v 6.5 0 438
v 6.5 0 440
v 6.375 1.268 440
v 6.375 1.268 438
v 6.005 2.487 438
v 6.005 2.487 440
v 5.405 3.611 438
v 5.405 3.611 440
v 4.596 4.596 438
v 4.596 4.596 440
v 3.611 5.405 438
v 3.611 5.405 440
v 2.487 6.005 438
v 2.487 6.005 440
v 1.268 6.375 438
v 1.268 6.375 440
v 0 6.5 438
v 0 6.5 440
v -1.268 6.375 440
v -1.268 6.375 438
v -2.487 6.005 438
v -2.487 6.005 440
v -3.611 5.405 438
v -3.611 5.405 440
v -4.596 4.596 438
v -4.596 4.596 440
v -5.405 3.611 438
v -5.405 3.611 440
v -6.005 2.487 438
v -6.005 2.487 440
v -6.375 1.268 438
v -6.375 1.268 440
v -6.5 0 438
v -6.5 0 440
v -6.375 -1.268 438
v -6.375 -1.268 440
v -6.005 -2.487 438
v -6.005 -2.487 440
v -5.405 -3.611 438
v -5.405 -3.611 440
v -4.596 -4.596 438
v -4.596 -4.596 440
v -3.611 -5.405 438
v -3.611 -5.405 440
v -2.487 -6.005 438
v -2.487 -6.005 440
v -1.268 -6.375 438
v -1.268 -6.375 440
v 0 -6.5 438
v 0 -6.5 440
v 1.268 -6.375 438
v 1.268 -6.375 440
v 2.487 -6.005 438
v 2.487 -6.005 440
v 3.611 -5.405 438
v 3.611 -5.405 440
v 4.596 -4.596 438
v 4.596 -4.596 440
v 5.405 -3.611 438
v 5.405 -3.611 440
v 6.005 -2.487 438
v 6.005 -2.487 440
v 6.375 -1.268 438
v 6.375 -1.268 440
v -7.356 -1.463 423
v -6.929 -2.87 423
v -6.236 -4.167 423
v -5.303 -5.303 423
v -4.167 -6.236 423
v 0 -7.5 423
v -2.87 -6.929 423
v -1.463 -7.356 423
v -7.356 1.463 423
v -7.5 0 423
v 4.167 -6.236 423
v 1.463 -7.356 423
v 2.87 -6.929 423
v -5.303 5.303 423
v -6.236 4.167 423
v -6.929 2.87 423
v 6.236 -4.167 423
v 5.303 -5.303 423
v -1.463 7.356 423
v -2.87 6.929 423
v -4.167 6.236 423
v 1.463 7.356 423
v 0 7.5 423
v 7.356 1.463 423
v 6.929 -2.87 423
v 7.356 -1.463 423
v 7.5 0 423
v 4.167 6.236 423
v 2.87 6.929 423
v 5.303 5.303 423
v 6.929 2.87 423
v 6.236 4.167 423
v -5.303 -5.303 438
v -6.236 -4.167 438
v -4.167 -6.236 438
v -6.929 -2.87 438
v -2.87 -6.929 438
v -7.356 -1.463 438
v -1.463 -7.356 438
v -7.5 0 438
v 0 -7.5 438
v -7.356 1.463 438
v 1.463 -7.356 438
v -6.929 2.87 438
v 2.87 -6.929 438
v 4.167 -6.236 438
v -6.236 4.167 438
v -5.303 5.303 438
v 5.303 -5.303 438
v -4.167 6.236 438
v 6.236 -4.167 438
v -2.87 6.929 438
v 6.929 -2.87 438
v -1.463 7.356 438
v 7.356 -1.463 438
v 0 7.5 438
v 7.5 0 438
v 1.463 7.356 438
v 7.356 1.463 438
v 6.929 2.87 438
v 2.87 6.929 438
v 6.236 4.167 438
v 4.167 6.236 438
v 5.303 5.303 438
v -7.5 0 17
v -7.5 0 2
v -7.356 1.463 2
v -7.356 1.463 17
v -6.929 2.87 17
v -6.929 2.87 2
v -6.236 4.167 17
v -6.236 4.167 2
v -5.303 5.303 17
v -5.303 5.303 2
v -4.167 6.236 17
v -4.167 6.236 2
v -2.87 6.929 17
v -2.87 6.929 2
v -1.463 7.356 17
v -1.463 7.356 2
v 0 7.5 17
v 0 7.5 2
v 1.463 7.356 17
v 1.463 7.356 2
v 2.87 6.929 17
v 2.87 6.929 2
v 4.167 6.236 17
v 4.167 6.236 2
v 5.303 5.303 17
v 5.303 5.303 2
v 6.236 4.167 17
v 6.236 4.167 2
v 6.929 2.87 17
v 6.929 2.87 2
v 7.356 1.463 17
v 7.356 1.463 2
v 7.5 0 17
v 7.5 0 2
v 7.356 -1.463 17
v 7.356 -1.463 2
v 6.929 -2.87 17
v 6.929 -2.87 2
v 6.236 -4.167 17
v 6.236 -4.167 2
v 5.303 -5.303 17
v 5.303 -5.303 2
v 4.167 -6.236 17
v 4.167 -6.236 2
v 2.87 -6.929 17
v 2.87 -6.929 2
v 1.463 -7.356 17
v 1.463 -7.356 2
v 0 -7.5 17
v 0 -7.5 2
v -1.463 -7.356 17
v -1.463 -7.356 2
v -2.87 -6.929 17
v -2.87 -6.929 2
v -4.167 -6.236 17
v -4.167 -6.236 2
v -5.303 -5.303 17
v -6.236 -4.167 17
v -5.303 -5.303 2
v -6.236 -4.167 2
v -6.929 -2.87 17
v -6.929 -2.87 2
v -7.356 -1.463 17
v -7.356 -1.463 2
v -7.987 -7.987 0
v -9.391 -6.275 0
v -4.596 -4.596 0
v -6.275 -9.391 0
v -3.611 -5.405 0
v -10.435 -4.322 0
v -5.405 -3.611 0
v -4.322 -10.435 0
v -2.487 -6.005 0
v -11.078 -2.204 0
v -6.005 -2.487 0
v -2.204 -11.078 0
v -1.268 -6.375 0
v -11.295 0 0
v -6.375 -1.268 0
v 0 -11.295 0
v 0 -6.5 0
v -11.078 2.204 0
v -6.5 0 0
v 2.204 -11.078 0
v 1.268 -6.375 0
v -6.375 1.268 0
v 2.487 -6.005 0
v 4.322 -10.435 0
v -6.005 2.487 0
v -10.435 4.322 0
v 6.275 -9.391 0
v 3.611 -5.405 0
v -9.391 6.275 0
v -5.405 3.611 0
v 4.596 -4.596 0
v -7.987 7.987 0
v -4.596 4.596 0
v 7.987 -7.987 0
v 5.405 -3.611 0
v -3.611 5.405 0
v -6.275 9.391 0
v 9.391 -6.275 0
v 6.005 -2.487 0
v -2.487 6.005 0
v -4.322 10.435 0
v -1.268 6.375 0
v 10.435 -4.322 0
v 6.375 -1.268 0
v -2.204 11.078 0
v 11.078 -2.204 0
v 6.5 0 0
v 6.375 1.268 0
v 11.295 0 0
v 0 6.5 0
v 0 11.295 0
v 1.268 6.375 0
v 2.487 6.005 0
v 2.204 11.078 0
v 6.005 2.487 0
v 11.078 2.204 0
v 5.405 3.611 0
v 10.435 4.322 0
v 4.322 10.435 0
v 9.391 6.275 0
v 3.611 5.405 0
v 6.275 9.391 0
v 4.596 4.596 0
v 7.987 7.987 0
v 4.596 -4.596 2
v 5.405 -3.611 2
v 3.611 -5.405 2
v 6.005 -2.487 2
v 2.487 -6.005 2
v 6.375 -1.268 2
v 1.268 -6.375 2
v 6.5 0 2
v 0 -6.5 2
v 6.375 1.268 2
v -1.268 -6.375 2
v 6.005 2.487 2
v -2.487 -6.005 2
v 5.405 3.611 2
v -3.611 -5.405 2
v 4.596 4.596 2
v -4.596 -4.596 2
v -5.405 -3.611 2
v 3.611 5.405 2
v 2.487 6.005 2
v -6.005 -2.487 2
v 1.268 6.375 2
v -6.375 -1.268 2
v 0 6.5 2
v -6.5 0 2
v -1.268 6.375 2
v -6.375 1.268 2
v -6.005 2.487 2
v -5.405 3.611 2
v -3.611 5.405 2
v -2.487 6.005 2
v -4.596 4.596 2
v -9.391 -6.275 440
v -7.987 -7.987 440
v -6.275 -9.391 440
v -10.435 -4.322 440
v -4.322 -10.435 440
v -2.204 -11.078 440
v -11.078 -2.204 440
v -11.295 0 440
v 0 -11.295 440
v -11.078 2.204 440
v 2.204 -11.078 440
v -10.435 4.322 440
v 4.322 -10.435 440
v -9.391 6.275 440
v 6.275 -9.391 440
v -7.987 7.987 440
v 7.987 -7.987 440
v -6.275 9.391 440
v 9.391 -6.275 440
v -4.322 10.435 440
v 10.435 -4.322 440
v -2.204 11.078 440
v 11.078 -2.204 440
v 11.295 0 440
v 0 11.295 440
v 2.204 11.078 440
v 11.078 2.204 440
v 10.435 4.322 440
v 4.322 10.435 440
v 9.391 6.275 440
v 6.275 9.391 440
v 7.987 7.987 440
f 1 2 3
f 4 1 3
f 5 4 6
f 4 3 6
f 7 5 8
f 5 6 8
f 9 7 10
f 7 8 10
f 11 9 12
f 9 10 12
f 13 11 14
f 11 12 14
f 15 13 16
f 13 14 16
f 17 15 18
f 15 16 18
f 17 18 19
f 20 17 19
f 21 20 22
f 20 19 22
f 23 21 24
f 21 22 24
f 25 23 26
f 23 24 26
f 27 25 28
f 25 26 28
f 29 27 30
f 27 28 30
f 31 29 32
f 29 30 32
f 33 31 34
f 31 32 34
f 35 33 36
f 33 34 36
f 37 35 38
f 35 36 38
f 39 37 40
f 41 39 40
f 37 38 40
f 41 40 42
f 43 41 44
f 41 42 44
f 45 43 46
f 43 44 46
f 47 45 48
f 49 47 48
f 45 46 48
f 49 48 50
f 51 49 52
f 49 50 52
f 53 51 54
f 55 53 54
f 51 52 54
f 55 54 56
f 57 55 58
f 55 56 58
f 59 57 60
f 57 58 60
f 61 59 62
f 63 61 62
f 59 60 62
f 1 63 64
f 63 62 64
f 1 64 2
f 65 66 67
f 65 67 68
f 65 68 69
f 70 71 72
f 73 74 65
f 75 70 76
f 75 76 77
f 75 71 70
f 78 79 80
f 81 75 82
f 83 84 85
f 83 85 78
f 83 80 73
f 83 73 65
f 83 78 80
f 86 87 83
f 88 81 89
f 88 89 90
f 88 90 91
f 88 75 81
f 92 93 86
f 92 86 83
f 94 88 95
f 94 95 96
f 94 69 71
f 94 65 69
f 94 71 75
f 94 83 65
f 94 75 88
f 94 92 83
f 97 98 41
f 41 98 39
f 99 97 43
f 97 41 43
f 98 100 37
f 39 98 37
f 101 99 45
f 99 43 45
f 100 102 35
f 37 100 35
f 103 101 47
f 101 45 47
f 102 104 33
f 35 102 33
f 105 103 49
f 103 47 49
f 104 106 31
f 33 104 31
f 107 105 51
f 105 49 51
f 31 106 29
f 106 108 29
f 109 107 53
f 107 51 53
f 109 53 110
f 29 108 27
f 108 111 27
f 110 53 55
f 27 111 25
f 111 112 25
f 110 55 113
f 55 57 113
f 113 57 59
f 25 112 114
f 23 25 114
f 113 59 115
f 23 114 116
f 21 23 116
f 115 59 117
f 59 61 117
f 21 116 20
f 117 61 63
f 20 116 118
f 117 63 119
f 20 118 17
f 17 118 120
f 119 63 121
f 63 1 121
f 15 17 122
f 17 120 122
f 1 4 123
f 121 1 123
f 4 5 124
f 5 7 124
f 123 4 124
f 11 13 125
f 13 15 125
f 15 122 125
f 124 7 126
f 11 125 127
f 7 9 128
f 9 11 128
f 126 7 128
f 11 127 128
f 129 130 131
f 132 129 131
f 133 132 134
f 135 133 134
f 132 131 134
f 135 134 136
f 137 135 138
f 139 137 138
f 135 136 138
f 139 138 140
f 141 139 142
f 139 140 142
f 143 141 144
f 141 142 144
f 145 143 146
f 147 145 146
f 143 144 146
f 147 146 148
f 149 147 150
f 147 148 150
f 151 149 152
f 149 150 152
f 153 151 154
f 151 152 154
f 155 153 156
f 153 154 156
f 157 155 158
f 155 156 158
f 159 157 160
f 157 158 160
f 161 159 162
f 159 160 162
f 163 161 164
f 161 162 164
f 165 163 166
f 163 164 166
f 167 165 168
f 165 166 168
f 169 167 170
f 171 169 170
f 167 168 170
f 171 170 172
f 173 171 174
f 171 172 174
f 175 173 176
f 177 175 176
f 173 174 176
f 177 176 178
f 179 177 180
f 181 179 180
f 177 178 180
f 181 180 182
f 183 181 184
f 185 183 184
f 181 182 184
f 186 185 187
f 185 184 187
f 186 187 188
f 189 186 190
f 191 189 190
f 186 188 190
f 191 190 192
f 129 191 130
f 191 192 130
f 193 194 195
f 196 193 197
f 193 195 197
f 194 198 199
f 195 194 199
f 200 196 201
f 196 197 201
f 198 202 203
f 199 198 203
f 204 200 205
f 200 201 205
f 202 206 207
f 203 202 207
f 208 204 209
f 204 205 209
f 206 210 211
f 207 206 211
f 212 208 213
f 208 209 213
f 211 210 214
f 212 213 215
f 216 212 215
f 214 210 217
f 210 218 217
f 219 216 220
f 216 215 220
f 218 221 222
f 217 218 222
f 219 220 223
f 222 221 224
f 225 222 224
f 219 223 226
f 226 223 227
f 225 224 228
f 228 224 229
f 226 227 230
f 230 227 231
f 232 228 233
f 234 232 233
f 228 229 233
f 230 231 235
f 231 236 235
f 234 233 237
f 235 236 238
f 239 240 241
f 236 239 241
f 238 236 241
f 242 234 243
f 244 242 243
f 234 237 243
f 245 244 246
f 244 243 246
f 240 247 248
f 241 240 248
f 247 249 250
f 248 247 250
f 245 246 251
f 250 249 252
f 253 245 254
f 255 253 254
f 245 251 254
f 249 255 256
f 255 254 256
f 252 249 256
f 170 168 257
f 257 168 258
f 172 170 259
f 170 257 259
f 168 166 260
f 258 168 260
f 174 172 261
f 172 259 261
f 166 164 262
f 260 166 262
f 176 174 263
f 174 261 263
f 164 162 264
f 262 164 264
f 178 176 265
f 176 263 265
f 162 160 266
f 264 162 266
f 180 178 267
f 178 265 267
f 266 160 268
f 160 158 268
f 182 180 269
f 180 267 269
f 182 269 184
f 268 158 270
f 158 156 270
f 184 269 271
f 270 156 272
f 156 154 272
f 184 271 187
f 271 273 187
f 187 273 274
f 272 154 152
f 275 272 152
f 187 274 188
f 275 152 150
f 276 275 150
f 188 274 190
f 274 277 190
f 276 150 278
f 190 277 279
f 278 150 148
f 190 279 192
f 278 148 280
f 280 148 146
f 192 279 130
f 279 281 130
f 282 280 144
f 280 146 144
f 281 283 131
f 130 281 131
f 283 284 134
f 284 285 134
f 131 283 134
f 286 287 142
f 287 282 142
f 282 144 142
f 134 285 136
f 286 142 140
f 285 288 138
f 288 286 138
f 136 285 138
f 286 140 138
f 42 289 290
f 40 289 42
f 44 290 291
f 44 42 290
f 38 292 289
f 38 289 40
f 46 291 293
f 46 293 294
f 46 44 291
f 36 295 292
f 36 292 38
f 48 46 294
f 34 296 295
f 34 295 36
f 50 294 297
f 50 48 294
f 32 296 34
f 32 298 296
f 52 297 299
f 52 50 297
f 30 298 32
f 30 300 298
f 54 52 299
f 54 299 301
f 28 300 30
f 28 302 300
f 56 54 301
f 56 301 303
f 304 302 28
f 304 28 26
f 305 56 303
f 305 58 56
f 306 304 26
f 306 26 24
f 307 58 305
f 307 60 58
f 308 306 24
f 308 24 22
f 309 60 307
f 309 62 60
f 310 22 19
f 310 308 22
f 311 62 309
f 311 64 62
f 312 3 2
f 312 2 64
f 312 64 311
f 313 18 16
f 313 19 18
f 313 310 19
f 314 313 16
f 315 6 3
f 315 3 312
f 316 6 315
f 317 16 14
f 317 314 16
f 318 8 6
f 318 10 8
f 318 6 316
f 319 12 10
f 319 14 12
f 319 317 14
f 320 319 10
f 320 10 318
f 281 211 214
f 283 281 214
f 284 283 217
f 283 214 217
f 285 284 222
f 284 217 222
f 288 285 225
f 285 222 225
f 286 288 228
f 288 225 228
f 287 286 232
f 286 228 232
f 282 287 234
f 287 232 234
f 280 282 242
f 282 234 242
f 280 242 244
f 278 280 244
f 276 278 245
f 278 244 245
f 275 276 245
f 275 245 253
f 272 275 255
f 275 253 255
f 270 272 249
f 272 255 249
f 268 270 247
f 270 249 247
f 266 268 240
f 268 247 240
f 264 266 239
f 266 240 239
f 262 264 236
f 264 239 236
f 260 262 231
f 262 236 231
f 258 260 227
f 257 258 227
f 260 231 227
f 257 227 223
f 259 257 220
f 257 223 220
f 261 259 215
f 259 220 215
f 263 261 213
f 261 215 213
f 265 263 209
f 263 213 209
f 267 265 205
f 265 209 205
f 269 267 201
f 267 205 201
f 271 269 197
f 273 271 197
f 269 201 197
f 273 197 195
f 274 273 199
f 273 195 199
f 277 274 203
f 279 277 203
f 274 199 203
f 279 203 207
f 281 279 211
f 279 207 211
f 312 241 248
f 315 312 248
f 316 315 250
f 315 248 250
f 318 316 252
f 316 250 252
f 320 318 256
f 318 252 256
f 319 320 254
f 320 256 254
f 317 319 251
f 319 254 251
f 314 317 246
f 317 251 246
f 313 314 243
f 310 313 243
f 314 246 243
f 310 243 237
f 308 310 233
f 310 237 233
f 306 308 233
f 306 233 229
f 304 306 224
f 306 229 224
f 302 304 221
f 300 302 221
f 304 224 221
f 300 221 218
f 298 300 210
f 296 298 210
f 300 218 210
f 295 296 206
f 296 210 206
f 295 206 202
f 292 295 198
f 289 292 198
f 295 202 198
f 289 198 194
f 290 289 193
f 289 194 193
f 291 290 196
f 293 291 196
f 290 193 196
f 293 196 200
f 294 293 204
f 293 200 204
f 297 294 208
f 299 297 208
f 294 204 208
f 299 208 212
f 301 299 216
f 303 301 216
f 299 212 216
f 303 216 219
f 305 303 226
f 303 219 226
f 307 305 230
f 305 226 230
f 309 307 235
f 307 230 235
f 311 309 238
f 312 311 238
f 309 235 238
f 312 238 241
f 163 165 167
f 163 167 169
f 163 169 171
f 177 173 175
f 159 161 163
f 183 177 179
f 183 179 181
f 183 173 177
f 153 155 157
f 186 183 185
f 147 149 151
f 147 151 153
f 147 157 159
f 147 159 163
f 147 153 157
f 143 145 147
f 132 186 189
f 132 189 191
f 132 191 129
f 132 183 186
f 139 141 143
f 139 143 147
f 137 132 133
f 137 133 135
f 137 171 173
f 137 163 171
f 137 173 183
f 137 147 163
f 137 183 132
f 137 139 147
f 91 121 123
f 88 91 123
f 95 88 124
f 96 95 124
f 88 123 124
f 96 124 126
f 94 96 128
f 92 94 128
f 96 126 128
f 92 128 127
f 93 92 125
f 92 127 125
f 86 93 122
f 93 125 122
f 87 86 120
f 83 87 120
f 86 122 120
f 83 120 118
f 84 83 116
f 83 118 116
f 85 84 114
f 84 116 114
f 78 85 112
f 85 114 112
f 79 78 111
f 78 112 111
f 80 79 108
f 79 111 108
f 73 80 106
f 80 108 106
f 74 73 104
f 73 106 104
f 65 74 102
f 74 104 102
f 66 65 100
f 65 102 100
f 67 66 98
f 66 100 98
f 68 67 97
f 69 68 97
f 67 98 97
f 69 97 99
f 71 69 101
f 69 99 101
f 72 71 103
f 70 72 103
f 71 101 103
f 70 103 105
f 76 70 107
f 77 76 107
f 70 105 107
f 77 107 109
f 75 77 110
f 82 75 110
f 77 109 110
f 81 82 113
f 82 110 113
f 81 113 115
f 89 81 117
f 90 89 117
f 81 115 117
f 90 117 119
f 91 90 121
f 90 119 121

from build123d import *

# Parameters (mm, degrees)
SKETCH1_R           = 11.295
BOSS_EXTRUDE1_DEPTH = 440
SKETCH4_R           = 6.5
CUT_EXTRUDE4_DEPTH  = 2
SKETCH5_R           = 7.5
CUT_EXTRUDE5_DEPTH  = 15
SKETCH6_R           = 6.5
CUT_EXTRUDE7_DEPTH  = 2
SKETCH8_R           = 7.5
CUT_EXTRUDE8_DEPTH  = 15


with BuildPart() as part:
    # Sketch1 → Boss-Extrude1 (new body)
    with BuildSketch(Plane.XY):
        Circle(SKETCH1_R)
    extrude(amount=BOSS_EXTRUDE1_DEPTH)

    # Sketch4 → Cut-Extrude4 (cut)
    with BuildSketch(Plane(origin=(0, 0, 0), x_dir=(-1, 0, 0), z_dir=(0, 0, -1))):
        Circle(SKETCH4_R)
    extrude(amount=-CUT_EXTRUDE4_DEPTH, mode=Mode.SUBTRACT)

    # Sketch5 → Cut-Extrude5 (cut)
    with BuildSketch(Plane(origin=(0, 0, 2), x_dir=(-1, 0, 0), z_dir=(0, 0, -1))):
        Circle(SKETCH5_R)
    extrude(amount=-CUT_EXTRUDE5_DEPTH, mode=Mode.SUBTRACT)

    # Sketch6 → Cut-Extrude7 (cut)
    with BuildSketch(Plane.XY.offset(440)):
        Circle(SKETCH6_R)
    extrude(amount=-CUT_EXTRUDE7_DEPTH, mode=Mode.SUBTRACT)

    # Sketch8 → Cut-Extrude8 (cut)
    with BuildSketch(Plane.XY.offset(438)):
        Circle(SKETCH8_R)
    extrude(amount=-CUT_EXTRUDE8_DEPTH, mode=Mode.SUBTRACT)


solid = part.part
